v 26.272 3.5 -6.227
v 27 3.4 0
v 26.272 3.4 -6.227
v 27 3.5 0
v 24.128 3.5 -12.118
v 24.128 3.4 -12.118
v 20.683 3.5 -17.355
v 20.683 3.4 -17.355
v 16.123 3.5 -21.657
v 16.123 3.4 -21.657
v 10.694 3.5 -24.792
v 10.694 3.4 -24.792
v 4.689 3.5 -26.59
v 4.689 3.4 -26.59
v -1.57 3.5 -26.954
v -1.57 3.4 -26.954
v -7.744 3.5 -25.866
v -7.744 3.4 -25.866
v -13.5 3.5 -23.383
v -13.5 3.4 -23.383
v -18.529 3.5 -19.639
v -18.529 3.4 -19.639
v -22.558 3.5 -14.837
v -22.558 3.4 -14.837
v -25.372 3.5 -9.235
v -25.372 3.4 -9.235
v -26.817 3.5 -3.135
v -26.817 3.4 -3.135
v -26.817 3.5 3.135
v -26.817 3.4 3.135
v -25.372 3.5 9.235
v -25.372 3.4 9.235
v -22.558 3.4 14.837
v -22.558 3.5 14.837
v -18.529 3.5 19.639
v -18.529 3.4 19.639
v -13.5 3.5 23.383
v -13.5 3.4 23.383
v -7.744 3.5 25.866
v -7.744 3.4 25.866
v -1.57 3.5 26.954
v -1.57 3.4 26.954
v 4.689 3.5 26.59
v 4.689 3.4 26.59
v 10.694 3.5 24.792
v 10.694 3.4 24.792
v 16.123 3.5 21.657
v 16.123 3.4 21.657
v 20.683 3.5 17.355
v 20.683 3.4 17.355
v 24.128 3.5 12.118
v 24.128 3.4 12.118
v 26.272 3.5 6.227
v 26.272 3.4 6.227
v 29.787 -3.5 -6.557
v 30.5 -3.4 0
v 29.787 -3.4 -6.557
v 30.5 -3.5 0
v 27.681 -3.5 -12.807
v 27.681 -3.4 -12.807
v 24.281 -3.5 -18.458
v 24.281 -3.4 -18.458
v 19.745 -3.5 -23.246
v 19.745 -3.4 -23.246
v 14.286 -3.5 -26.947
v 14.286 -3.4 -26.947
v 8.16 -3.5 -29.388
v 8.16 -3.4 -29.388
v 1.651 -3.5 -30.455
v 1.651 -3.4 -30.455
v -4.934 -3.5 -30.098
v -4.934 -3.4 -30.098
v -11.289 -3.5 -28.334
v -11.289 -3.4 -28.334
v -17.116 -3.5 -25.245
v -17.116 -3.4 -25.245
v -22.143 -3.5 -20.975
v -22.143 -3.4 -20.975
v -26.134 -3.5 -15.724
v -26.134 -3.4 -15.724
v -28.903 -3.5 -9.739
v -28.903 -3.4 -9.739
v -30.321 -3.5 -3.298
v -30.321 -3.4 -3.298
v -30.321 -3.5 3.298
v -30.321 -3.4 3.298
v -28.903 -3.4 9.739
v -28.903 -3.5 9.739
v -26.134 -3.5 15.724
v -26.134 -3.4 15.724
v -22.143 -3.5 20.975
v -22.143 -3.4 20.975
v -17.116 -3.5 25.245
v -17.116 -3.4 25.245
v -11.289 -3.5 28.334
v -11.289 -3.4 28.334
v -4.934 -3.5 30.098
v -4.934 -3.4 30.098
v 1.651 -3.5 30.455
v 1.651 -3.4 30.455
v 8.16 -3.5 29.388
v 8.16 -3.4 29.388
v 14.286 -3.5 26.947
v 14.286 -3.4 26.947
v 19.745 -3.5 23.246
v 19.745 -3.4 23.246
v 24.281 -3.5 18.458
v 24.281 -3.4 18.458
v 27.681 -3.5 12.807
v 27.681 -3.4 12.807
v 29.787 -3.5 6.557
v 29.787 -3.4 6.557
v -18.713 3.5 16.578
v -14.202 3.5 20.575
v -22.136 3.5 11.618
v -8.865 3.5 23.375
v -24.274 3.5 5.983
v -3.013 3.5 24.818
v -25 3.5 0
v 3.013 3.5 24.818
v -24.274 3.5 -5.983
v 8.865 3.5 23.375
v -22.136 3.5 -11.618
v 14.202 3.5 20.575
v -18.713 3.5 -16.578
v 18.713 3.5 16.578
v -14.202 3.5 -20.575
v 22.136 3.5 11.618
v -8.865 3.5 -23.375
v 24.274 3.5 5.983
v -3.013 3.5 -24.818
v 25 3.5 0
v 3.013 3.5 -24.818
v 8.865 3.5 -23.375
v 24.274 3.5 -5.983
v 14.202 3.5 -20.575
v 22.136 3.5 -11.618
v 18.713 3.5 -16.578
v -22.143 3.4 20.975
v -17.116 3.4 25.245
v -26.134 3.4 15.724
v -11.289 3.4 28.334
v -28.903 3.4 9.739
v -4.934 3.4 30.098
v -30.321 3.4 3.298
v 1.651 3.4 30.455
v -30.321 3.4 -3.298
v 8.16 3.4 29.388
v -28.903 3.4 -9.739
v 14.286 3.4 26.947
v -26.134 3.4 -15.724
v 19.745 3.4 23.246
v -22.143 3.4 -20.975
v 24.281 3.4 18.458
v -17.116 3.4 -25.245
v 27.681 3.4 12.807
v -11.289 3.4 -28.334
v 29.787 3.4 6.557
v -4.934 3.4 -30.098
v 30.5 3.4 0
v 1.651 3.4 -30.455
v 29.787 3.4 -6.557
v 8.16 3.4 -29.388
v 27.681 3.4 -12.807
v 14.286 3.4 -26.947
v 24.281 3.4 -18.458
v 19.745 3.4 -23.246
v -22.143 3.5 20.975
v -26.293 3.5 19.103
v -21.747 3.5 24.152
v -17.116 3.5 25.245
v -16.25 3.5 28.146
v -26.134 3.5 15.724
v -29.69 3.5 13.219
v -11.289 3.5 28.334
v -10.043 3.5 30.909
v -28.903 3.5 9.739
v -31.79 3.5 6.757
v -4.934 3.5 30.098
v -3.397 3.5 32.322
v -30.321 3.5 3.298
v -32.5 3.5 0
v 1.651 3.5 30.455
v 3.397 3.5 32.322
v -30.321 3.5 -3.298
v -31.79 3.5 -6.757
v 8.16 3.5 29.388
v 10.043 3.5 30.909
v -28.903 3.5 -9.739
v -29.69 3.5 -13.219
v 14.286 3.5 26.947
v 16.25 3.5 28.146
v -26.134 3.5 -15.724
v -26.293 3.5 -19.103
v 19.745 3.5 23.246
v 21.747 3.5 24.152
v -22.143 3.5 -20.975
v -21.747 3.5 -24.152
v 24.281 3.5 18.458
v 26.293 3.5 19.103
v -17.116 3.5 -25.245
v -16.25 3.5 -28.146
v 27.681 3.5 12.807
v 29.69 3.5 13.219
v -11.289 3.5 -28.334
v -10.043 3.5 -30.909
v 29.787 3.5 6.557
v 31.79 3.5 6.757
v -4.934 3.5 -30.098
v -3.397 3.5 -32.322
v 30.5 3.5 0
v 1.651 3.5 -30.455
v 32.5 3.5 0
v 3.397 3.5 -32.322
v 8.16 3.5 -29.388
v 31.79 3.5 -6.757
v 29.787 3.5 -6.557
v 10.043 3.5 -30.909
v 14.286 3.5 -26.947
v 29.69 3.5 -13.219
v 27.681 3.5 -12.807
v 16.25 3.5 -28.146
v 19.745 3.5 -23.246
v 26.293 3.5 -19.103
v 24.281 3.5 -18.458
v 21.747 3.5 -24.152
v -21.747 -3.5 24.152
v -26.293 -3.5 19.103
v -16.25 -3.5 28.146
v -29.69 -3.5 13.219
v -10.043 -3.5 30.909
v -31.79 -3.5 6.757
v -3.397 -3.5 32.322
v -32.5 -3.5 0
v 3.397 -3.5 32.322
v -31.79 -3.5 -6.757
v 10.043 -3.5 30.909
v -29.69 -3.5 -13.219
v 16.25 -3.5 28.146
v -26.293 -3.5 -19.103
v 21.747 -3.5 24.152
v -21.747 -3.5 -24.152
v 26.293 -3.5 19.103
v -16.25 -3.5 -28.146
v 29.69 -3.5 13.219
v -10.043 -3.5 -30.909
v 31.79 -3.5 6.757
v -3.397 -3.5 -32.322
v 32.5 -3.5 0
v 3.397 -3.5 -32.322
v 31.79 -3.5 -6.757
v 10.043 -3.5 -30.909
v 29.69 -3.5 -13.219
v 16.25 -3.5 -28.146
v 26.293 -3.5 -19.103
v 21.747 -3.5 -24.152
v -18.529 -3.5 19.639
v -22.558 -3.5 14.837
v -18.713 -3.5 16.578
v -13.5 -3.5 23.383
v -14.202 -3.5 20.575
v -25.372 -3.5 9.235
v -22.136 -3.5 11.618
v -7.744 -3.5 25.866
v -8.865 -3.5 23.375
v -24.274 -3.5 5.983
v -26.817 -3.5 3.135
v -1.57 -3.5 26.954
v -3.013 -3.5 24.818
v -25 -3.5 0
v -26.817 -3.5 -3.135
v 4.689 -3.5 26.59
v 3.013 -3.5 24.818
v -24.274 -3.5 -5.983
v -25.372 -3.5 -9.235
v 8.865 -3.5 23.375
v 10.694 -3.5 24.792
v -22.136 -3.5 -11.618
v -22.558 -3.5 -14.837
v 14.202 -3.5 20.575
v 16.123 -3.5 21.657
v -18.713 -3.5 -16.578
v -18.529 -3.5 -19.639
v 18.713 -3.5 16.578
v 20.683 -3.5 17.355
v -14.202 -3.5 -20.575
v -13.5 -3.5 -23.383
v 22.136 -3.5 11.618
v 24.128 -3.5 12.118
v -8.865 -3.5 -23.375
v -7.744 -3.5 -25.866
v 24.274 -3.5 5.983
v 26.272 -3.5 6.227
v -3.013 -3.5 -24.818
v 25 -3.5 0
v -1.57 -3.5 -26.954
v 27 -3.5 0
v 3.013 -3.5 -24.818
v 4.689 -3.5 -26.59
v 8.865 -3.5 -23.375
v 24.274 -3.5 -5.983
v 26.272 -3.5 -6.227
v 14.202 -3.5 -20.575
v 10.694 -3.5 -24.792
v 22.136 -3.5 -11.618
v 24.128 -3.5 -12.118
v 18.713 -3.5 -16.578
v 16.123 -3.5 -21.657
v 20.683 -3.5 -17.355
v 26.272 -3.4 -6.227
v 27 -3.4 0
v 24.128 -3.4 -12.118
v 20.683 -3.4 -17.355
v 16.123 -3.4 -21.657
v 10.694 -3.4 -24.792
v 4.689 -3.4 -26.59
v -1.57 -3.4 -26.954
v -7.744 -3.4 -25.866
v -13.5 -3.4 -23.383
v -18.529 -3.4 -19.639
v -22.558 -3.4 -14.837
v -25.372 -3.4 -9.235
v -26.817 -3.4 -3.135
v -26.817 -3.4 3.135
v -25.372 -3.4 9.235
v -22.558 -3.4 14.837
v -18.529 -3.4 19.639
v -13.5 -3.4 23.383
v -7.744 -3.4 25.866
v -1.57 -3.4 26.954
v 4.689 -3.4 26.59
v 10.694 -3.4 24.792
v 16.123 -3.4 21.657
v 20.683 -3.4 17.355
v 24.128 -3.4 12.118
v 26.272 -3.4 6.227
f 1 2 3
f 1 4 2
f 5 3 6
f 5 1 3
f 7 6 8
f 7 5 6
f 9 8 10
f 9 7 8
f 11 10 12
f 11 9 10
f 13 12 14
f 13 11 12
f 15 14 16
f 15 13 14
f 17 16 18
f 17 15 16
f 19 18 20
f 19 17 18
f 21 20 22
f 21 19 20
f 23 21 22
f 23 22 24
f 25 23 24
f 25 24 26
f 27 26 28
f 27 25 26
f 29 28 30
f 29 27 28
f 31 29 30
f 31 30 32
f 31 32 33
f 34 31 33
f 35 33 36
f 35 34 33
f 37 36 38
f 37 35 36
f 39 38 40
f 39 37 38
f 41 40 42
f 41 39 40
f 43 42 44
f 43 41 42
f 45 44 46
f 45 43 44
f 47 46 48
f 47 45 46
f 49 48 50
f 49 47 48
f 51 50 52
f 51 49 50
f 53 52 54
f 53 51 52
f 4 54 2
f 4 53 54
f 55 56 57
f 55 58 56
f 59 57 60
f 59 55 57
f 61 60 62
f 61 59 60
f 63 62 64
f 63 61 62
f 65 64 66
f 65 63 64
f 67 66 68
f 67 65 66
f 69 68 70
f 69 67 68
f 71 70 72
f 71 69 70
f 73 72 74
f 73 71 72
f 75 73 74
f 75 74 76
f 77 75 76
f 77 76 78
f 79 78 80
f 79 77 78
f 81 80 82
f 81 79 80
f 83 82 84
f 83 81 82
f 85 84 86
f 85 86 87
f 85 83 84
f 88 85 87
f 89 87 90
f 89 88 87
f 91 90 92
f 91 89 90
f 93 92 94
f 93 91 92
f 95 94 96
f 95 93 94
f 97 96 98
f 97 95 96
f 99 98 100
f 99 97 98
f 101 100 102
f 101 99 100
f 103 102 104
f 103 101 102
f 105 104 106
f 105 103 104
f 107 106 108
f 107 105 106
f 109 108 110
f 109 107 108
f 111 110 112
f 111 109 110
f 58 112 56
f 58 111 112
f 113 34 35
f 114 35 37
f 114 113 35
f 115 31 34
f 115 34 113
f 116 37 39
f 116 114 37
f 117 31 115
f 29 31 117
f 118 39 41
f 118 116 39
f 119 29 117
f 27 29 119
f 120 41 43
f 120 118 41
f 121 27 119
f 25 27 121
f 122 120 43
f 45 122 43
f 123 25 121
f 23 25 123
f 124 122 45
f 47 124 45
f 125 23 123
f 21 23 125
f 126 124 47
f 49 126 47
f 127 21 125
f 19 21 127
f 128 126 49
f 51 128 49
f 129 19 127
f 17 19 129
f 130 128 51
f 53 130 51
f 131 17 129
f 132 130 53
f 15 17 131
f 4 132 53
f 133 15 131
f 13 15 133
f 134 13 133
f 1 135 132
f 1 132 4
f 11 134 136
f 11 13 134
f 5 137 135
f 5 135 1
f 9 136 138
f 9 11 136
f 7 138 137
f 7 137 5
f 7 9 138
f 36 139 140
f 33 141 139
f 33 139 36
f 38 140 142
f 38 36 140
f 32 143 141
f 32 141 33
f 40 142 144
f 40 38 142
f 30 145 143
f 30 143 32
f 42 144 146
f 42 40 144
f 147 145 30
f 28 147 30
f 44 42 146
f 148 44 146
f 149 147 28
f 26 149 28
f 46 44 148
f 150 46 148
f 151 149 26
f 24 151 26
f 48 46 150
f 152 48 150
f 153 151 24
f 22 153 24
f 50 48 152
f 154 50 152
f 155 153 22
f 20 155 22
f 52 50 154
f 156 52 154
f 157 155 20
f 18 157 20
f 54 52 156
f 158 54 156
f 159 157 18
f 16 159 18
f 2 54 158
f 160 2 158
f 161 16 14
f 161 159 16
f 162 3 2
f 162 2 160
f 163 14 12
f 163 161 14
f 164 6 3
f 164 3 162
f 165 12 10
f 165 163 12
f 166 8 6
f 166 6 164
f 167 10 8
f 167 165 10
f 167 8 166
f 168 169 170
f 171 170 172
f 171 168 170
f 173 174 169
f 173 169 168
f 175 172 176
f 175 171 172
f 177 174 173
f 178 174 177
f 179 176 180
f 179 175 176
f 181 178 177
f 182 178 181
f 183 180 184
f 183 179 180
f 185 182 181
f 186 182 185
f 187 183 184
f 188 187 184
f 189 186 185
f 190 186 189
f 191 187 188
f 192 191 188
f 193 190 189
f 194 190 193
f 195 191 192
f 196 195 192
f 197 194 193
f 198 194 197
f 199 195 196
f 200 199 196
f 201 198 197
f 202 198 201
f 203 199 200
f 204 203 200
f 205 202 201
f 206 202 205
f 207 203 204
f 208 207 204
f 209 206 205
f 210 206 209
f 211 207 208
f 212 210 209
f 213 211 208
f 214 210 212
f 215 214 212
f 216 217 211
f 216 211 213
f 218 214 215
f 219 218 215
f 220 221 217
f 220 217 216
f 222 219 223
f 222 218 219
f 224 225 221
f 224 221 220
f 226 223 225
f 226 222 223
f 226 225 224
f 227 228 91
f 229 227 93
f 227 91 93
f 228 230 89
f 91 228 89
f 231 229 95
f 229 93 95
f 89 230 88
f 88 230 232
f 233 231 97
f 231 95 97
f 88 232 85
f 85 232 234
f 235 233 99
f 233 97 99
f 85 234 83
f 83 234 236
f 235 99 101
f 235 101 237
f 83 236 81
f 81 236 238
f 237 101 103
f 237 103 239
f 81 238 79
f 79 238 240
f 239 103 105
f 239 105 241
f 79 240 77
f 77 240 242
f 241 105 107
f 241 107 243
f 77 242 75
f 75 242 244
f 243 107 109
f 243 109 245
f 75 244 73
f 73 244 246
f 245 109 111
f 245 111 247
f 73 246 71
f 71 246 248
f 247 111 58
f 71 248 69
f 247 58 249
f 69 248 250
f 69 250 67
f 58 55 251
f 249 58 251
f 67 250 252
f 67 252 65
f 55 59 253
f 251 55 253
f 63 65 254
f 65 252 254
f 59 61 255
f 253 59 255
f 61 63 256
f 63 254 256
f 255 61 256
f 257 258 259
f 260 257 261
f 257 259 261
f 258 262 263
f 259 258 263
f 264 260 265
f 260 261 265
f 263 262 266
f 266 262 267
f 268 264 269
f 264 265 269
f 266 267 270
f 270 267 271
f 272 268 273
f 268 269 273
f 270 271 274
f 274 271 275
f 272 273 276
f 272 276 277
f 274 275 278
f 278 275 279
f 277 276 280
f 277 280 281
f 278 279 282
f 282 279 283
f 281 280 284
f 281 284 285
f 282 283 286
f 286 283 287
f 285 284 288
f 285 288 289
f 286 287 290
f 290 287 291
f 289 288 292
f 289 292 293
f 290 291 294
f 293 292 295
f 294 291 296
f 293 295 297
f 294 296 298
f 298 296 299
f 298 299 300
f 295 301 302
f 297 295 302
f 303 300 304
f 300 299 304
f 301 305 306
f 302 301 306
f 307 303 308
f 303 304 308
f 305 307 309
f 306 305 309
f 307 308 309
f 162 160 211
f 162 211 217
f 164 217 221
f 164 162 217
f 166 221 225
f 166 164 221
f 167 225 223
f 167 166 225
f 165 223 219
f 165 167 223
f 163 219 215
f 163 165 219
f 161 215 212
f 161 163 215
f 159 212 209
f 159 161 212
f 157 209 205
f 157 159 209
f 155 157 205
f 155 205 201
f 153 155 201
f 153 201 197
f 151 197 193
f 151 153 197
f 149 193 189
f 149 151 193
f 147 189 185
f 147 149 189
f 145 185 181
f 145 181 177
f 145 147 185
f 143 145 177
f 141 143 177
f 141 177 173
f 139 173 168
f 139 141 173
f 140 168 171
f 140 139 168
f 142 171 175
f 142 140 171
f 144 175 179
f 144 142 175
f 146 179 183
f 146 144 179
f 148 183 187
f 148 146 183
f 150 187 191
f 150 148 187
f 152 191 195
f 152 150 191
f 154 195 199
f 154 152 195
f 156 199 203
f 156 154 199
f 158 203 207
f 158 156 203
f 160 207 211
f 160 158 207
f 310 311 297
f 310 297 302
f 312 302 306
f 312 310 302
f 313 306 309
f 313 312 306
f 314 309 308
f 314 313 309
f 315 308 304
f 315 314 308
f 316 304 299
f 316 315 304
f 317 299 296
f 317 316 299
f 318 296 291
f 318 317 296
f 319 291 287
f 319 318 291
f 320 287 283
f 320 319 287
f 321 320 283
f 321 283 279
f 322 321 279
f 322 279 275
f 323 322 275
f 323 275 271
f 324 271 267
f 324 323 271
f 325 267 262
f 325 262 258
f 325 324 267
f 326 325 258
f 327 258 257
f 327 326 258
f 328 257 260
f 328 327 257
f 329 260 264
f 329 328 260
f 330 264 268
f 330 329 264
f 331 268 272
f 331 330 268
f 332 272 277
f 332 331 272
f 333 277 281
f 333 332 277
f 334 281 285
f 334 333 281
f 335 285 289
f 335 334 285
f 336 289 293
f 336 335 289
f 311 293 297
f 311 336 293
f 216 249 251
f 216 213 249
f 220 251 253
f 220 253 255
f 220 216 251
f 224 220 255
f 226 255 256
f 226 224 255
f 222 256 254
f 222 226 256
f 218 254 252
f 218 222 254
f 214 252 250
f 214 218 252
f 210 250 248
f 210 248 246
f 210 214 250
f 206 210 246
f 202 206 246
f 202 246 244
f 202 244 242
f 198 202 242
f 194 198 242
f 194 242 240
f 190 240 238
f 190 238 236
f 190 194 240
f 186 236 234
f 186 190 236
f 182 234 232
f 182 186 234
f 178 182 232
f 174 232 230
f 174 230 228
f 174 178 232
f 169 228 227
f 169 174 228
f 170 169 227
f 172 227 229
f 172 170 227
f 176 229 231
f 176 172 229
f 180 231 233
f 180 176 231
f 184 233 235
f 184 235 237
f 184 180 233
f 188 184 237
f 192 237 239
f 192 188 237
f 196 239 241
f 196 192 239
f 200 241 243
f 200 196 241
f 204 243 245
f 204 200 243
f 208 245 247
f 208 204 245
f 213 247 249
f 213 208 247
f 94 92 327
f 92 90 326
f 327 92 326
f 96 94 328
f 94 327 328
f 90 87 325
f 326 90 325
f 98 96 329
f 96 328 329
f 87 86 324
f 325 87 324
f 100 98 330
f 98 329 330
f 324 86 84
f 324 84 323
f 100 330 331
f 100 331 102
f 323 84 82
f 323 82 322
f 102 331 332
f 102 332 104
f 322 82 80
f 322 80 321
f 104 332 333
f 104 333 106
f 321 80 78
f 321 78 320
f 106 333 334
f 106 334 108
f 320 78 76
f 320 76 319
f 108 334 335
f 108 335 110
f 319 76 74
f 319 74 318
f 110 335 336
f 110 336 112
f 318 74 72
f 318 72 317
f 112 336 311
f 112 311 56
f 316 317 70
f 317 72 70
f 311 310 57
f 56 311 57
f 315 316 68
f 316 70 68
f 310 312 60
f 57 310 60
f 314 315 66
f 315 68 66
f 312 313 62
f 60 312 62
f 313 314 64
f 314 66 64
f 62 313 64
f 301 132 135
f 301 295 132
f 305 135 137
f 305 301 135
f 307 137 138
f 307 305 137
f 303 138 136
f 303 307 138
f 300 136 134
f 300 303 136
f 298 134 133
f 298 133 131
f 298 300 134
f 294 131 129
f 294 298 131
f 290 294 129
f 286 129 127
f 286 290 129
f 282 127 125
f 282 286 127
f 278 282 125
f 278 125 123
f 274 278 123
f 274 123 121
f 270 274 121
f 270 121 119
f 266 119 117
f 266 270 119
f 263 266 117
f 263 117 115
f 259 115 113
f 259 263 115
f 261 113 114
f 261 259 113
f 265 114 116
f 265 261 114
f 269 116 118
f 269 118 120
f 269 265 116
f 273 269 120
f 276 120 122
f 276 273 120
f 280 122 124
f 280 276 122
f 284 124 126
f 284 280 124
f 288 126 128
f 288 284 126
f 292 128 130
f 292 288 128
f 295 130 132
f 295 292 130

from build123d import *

# Parameters (mm, degrees)
SKETCH1_R             = 32.5
SKETCH1_R_2           = 30.5
BOSS_EXTRUDE1_DEPTH   = 3.5
SKETCH1_R_3           = 27
SKETCH1_R_4           = 25
BOSS_EXTRUDE1_2_DEPTH = 3.5
SKETCH1_3_R           = 30.5
SKETCH1_3_R_2         = 27
BOSS_EXTRUDE2_DEPTH   = 3.4


with BuildPart() as part:
    # Sketch1 → Boss-Extrude1 (new, symmetric)
    with BuildSketch(Plane(origin=(0, 0, 0), x_dir=(1, 0, 0), z_dir=(0, 1, 0))):
        Circle(SKETCH1_R)
        Circle(SKETCH1_R_2, mode=Mode.SUBTRACT)
    extrude(amount=BOSS_EXTRUDE1_DEPTH, both=True)



with BuildPart() as body_2:
    # Sketch1 → Boss-Extrude1 2 (new, symmetric)
    with BuildSketch(Plane(origin=(0, 0, 0), x_dir=(1, 0, 0), z_dir=(0, 1, 0))):
        Circle(SKETCH1_R_3)
        Circle(SKETCH1_R_4, mode=Mode.SUBTRACT)
    extrude(amount=BOSS_EXTRUDE1_2_DEPTH, both=True)


with BuildPart() as part_1:
    add(part.part)

    add(body_2.part)  # Boss-Extrude2 merges body 2
    # Sketch1<3> → Boss-Extrude2 (add, symmetric)
    with BuildSketch(Plane(origin=(0, 0, 0), x_dir=(1, 0, 0), z_dir=(0, 1, 0))):
        Circle(SKETCH1_3_R)
        Circle(SKETCH1_3_R_2, mode=Mode.SUBTRACT)
    extrude(amount=BOSS_EXTRUDE2_DEPTH, both=True)


solid = part_1.part
